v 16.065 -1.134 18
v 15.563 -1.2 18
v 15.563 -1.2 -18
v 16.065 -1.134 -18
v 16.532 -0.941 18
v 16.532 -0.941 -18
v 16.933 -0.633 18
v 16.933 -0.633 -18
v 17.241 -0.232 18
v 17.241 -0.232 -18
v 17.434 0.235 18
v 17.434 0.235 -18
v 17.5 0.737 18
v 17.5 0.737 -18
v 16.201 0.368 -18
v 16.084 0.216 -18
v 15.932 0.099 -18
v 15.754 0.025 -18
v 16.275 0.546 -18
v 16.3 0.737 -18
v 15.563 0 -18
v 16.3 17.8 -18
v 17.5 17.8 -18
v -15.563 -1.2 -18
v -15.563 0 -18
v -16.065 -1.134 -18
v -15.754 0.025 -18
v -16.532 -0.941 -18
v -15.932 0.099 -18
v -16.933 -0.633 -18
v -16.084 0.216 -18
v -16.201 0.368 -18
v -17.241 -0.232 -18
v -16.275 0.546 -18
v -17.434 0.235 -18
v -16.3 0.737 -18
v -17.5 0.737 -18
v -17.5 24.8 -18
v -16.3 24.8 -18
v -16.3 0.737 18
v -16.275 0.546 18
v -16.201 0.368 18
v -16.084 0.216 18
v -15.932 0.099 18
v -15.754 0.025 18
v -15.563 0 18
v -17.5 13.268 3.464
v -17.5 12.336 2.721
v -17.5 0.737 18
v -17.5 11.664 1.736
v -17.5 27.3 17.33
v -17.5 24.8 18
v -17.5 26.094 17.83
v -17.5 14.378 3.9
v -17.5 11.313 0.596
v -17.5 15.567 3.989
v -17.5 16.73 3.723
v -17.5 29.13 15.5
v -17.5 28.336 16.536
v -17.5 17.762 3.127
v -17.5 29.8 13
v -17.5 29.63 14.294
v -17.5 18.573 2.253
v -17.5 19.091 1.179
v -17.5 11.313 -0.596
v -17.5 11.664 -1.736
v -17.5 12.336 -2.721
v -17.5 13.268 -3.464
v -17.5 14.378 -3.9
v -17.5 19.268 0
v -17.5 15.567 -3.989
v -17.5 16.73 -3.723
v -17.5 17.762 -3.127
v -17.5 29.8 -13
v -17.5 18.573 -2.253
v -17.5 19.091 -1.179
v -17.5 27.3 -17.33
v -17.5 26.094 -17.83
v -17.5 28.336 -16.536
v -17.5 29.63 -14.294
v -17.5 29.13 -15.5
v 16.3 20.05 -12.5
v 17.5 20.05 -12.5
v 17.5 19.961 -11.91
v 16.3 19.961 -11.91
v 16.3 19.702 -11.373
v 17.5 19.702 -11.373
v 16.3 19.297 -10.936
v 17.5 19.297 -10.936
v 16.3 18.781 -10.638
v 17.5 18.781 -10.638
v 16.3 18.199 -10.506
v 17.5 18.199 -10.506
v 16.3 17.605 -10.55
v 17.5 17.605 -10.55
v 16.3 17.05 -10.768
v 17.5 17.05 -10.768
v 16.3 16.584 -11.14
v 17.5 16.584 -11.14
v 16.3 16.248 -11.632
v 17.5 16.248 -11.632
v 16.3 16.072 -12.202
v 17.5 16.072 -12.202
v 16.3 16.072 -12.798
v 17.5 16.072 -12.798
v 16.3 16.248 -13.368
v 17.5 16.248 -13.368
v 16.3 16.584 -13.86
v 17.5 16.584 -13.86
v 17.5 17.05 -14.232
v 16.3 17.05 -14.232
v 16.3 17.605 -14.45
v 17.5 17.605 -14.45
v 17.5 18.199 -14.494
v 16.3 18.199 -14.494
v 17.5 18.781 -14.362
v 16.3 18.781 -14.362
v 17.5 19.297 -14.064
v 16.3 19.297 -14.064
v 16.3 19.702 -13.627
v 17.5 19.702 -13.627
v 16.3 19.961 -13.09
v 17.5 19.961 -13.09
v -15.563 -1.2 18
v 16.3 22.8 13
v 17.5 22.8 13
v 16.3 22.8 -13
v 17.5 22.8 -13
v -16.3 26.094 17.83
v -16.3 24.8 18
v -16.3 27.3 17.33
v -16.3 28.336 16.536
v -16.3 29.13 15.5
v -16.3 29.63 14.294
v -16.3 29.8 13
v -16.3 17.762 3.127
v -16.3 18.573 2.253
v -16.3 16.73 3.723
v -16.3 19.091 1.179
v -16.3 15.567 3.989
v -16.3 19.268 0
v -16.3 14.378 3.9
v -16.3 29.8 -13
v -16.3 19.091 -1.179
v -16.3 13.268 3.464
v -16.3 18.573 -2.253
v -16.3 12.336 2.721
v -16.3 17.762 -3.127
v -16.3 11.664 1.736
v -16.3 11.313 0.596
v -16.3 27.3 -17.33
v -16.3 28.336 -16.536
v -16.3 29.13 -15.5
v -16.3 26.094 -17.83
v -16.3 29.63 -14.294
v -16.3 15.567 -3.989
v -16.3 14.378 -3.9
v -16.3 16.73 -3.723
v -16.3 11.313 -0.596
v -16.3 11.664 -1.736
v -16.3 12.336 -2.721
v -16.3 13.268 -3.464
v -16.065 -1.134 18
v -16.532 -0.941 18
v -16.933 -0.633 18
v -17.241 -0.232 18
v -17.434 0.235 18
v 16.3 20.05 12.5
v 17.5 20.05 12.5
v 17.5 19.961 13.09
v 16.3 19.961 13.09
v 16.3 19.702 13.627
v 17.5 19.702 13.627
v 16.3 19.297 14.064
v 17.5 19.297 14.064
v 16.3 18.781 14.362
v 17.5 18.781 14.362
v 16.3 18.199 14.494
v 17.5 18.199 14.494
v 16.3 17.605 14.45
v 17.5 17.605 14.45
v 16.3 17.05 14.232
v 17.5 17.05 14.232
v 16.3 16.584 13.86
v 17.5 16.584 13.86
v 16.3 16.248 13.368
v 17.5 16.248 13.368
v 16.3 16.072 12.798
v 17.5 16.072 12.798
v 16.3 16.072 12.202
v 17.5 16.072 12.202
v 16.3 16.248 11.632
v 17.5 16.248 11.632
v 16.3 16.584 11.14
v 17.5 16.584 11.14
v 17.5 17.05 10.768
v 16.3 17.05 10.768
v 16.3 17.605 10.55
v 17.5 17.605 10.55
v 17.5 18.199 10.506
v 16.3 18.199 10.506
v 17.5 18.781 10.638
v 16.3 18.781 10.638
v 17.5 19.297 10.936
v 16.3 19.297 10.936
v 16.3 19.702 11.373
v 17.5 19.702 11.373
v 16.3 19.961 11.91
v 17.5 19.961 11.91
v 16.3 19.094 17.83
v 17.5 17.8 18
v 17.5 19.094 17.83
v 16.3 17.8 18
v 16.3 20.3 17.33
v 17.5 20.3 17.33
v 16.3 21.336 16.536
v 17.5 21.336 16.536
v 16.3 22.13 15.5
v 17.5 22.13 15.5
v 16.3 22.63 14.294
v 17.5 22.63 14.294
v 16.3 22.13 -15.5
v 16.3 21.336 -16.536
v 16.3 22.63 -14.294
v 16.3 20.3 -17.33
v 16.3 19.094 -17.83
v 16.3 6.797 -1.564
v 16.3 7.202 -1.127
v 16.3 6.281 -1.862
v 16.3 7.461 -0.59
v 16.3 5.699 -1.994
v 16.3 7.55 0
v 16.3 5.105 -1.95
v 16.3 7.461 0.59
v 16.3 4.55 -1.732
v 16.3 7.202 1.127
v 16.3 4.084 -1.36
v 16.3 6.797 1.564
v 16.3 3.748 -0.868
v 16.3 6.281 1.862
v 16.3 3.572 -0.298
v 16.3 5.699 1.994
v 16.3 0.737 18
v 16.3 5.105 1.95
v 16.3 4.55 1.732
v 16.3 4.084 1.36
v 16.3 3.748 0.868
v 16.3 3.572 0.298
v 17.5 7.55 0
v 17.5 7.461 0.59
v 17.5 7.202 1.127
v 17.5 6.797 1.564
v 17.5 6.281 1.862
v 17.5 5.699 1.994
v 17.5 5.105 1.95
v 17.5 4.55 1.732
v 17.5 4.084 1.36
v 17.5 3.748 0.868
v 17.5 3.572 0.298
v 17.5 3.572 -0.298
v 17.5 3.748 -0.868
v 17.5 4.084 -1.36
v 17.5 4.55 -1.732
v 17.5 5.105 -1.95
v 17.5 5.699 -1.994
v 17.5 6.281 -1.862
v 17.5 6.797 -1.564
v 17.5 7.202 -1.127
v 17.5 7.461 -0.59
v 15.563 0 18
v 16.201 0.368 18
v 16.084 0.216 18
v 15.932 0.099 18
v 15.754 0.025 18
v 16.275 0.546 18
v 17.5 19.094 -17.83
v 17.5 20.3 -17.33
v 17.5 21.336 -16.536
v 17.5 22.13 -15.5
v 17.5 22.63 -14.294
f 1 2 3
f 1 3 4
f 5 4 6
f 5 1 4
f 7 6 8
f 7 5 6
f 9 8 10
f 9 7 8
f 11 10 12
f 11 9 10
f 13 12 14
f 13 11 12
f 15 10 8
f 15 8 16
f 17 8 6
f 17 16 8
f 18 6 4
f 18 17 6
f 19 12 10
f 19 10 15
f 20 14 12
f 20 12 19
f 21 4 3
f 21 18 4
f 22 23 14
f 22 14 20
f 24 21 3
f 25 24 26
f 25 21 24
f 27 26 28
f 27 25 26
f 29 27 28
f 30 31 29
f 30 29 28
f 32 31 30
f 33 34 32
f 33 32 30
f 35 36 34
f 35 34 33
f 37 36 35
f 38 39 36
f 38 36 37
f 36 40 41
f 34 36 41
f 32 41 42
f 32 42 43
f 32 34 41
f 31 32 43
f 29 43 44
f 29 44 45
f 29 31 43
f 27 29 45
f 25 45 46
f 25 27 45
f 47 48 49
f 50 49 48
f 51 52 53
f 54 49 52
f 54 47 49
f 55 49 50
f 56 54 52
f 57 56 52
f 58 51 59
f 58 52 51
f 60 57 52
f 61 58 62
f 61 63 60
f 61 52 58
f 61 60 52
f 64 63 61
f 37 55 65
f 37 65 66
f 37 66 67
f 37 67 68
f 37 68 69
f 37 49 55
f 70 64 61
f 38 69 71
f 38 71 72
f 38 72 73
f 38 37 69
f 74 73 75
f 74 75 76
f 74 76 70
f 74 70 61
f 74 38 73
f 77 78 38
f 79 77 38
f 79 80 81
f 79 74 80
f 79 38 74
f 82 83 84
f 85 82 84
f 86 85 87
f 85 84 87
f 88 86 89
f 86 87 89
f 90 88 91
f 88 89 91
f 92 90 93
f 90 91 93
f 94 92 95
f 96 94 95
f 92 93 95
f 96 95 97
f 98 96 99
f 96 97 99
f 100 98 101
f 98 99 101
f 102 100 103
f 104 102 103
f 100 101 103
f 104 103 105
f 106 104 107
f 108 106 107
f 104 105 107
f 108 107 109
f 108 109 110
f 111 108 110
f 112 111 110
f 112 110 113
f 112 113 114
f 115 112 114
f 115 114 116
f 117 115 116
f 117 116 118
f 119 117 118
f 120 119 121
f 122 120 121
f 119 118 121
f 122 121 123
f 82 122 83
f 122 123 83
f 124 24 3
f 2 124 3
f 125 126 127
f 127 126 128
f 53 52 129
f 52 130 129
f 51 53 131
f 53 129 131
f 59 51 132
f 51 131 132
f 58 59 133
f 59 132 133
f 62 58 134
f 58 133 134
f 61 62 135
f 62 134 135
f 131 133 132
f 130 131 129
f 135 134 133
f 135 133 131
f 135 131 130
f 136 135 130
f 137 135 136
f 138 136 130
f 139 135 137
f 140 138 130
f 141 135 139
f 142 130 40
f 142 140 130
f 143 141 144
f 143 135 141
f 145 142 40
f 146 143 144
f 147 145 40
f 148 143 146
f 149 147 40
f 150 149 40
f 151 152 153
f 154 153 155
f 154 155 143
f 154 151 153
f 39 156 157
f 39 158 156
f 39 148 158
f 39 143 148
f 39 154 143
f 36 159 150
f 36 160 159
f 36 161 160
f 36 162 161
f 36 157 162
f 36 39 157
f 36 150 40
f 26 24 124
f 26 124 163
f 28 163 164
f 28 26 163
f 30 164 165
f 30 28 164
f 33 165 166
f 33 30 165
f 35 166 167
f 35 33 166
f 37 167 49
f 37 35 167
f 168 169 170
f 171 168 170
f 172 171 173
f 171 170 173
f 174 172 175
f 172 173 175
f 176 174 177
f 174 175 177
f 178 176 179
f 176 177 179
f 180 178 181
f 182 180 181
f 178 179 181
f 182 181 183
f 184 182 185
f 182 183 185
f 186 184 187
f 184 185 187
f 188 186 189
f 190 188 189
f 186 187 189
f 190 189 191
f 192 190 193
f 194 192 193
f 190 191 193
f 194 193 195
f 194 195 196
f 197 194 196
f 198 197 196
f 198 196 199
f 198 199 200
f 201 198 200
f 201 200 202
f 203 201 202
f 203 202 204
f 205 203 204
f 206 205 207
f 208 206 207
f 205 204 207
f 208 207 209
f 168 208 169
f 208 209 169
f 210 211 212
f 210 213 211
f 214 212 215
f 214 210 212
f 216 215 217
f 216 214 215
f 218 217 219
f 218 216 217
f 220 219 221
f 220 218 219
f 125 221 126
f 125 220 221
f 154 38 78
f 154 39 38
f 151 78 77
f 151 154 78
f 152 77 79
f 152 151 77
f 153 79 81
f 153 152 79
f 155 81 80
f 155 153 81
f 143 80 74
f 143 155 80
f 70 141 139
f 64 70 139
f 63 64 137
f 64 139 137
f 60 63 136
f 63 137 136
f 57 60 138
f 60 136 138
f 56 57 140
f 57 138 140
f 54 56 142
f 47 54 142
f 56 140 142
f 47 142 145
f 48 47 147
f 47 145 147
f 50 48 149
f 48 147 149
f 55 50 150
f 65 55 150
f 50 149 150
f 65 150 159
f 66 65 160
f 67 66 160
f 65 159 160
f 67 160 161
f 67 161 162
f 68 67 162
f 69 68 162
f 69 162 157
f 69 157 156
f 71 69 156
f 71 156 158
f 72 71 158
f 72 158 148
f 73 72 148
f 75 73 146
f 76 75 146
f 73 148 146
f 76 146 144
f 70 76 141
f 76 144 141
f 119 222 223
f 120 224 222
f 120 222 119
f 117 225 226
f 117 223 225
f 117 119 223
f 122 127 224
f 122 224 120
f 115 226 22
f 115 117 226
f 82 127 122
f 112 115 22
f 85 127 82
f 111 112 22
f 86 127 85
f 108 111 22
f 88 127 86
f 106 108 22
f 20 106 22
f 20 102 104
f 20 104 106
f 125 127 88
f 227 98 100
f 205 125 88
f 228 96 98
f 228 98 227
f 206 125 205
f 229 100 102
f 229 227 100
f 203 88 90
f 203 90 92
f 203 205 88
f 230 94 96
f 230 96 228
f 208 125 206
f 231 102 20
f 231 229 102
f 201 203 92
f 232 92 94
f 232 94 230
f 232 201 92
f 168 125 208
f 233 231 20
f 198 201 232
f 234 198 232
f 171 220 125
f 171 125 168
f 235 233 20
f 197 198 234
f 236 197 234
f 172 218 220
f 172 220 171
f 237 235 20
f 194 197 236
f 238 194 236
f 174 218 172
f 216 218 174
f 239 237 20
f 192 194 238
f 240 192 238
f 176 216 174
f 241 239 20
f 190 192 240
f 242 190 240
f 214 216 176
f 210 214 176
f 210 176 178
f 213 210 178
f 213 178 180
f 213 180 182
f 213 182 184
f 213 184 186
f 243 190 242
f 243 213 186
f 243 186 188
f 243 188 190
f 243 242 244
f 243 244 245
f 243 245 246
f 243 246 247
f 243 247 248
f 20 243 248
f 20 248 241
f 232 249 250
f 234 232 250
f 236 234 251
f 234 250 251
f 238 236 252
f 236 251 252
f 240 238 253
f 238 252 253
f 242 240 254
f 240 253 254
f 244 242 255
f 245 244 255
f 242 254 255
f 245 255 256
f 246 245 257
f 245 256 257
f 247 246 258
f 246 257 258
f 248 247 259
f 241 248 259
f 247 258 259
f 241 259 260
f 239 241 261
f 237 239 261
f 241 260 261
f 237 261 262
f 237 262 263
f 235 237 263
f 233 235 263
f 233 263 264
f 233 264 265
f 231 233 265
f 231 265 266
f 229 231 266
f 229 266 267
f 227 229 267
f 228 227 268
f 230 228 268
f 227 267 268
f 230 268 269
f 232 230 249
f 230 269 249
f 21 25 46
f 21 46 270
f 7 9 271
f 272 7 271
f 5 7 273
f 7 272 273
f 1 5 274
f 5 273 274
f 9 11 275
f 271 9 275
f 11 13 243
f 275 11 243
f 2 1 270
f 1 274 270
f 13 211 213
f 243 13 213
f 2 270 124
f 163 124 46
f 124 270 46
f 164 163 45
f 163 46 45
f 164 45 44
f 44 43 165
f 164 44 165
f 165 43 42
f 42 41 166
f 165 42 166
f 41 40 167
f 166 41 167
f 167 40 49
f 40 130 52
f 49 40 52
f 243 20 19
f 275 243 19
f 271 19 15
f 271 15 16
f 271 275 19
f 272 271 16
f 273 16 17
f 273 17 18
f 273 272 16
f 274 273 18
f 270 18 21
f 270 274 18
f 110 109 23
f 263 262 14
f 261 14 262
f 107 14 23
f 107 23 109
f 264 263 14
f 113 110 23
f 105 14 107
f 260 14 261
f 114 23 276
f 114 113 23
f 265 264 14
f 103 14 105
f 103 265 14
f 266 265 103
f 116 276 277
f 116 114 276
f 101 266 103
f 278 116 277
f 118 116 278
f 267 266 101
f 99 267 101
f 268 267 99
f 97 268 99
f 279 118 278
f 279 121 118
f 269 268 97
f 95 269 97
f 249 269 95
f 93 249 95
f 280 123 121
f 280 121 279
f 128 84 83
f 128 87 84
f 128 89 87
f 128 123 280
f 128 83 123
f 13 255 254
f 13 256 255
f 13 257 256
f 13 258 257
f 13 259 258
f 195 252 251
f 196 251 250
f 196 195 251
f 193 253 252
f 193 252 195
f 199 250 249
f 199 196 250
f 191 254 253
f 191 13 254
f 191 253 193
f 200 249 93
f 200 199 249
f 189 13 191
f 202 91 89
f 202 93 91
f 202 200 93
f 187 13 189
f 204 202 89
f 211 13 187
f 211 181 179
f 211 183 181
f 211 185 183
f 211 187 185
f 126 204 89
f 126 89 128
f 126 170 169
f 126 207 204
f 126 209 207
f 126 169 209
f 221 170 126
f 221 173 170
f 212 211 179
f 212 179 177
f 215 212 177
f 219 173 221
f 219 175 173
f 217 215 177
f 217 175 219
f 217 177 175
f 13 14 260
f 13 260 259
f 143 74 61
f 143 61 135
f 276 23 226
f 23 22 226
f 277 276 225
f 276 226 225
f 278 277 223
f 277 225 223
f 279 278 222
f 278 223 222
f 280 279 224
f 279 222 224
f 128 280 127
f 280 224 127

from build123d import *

# Parameters (mm, degrees)
CROQUIS1_W                         = 35
CROQUIS1_H                         = 36
BRIDA_BASE1_DEPTH                  = 1.2
BRIDA_DE_ARISTA1_STRIP_W           = 6.2732
BRIDA_DE_ARISTA1_STRIP_H           = 1.2
BRIDA_DE_ARISTA1_STRIP_CUT_DEPTH   = 36
BRIDA_DE_ARISTA1_STRIP_2_W         = 6.2732
BRIDA_DE_ARISTA1_STRIP_2_H         = 1.2
BRIDA_DE_ARISTA1_STRIP_CUT_2_DEPTH = 36
BRIDA_DE_ARISTA1_DEPTH             = 36
BRIDA_DE_ARISTA1_BEND_DEPTH        = 36
CROQUIS14_W                        = 36
CROQUIS14_H                        = 7
CORTAR_EXTRUIR3_DEPTH              = 1.2
CROQUIS12_R                        = 2
CORTAR_EXTRUIR1_DEPTH              = 1.2
CROQUIS13_R                        = 4
CORTAR_EXTRUIR2_DEPTH              = 1.2
REDONDEO1_R                        = 5


# Sheet-metal steps are written as plain solids
with BuildPart() as part:
    # Croquis1 → Brida base1 (new body)
    with BuildSketch(Plane(origin=(0, 0, 0), x_dir=(1, 0, 0), z_dir=(0, 1, 0))):
        Rectangle(CROQUIS1_W, CROQUIS1_H)
    extrude(amount=-BRIDA_BASE1_DEPTH)

    # Brida de arista1 strip (across the edge) → Brida de arista1 strip cut (cut)
    with BuildSketch(Plane(origin=(17.5, 0, 18), x_dir=(-1, 0, 0), z_dir=(0, 0, -1))):
        with Locations((-1.2, -0.6)):
            Rectangle(BRIDA_DE_ARISTA1_STRIP_W, BRIDA_DE_ARISTA1_STRIP_H)
    extrude(amount=BRIDA_DE_ARISTA1_STRIP_CUT_DEPTH, mode=Mode.SUBTRACT)

    # Brida de arista1 strip 2 (across the edge) → Brida de arista1 strip cut 2 (cut)
    with BuildSketch(Plane(origin=(-17.5, 0, -18), x_dir=(1, 0, 0), z_dir=(0, 0, 1))):
        with Locations((-1.2, -0.6)):
            Rectangle(BRIDA_DE_ARISTA1_STRIP_2_W, BRIDA_DE_ARISTA1_STRIP_2_H)
    extrude(amount=BRIDA_DE_ARISTA1_STRIP_CUT_2_DEPTH, mode=Mode.SUBTRACT)

    # Brida de arista1 section (across the edge) → Brida de arista1 (add)
    with BuildSketch(Plane(origin=(17.5, 0, 18), x_dir=(-1, 0, 0), z_dir=(0, 0, -1))):
        with BuildLine():
            Line((0, 0.7366), (0, 29.8))
            Line((0, 29.8), (1.2, 29.8))
            Line((1.2, 29.8), (1.2, 0.7366))
            ThreePointArc((1.2, 0.7366), (1.415745145, 0.215745145), (1.9366, 0))
            Line((1.9366, 0), (1.9366, -1.2))
            ThreePointArc((1.9366, -1.2), (0.567217008, -0.632782992), (0, 0.7366))
        make_face()
    extrude(amount=BRIDA_DE_ARISTA1_DEPTH)

    # Brida de arista1 section 2 (across the edge) → Brida de arista1 bend (add)
    with BuildSketch(Plane(origin=(-17.5, 0, -18), x_dir=(1, 0, 0), z_dir=(0, 0, 1))):
        with BuildLine():
            Line((0, 0.7366), (0, 29.8))
            Line((0, 29.8), (1.2, 29.8))
            Line((1.2, 29.8), (1.2, 0.7366))
            ThreePointArc((1.2, 0.7366), (1.415745145, 0.215745145), (1.9366, 0))
            Line((1.9366, 0), (1.9366, -1.2))
            ThreePointArc((1.9366, -1.2), (0.567217008, -0.632782992), (0, 0.7366))
        make_face()
    extrude(amount=BRIDA_DE_ARISTA1_BEND_DEPTH)

    # Croquis14 → Cortar-Extruir3 (cut)
    with BuildSketch(Plane(origin=(17.5, 0, 0), x_dir=(0, 0, -1), z_dir=(1, 0, 0))):
        with Locations((0, 26.3)):
            Rectangle(CROQUIS14_W, CROQUIS14_H)
    extrude(amount=-CORTAR_EXTRUIR3_DEPTH, mode=Mode.SUBTRACT)

    # Croquis12 → Cortar-Extruir1 (cut)
    with BuildSketch(Plane(origin=(17.5, 0, 0), x_dir=(0, 0, -1), z_dir=(1, 0, 0))):
        with Locations(Location((-12.5, 18.05, 0), (0, 0, 90))):
            Circle(CROQUIS12_R)
        with Locations(Location((12.5, 18.05, 0), (0, 0, 90))):
            Circle(CROQUIS12_R)
        with Locations(Location((0, 5.55, 0), (0, 0, 90))):
            Circle(CROQUIS12_R)
    extrude(amount=-CORTAR_EXTRUIR1_DEPTH, mode=Mode.SUBTRACT)

    # Croquis13 → Cortar-Extruir2 (cut)
    with BuildSketch(Plane(origin=(-16.3, 0, 0), x_dir=(0, 0, -1), z_dir=(1, 0, 0))):
        with Locations(Location((0, 15.2683, 0), (0, 0, 90))):
            Circle(CROQUIS13_R)
    extrude(amount=-CORTAR_EXTRUIR2_DEPTH, mode=Mode.SUBTRACT)

    # Redondeo1
    redondeo1_edges = [part.edges().sort_by_distance(p)[0] for p in [
        (-16.9, 29.8, -18),
        (-16.9, 29.8, 18),
        (16.9, 22.8, 18),
        (16.9, 22.8, -18),
    ]]
    fillet(redondeo1_edges, radius=REDONDEO1_R)


solid = part.part
